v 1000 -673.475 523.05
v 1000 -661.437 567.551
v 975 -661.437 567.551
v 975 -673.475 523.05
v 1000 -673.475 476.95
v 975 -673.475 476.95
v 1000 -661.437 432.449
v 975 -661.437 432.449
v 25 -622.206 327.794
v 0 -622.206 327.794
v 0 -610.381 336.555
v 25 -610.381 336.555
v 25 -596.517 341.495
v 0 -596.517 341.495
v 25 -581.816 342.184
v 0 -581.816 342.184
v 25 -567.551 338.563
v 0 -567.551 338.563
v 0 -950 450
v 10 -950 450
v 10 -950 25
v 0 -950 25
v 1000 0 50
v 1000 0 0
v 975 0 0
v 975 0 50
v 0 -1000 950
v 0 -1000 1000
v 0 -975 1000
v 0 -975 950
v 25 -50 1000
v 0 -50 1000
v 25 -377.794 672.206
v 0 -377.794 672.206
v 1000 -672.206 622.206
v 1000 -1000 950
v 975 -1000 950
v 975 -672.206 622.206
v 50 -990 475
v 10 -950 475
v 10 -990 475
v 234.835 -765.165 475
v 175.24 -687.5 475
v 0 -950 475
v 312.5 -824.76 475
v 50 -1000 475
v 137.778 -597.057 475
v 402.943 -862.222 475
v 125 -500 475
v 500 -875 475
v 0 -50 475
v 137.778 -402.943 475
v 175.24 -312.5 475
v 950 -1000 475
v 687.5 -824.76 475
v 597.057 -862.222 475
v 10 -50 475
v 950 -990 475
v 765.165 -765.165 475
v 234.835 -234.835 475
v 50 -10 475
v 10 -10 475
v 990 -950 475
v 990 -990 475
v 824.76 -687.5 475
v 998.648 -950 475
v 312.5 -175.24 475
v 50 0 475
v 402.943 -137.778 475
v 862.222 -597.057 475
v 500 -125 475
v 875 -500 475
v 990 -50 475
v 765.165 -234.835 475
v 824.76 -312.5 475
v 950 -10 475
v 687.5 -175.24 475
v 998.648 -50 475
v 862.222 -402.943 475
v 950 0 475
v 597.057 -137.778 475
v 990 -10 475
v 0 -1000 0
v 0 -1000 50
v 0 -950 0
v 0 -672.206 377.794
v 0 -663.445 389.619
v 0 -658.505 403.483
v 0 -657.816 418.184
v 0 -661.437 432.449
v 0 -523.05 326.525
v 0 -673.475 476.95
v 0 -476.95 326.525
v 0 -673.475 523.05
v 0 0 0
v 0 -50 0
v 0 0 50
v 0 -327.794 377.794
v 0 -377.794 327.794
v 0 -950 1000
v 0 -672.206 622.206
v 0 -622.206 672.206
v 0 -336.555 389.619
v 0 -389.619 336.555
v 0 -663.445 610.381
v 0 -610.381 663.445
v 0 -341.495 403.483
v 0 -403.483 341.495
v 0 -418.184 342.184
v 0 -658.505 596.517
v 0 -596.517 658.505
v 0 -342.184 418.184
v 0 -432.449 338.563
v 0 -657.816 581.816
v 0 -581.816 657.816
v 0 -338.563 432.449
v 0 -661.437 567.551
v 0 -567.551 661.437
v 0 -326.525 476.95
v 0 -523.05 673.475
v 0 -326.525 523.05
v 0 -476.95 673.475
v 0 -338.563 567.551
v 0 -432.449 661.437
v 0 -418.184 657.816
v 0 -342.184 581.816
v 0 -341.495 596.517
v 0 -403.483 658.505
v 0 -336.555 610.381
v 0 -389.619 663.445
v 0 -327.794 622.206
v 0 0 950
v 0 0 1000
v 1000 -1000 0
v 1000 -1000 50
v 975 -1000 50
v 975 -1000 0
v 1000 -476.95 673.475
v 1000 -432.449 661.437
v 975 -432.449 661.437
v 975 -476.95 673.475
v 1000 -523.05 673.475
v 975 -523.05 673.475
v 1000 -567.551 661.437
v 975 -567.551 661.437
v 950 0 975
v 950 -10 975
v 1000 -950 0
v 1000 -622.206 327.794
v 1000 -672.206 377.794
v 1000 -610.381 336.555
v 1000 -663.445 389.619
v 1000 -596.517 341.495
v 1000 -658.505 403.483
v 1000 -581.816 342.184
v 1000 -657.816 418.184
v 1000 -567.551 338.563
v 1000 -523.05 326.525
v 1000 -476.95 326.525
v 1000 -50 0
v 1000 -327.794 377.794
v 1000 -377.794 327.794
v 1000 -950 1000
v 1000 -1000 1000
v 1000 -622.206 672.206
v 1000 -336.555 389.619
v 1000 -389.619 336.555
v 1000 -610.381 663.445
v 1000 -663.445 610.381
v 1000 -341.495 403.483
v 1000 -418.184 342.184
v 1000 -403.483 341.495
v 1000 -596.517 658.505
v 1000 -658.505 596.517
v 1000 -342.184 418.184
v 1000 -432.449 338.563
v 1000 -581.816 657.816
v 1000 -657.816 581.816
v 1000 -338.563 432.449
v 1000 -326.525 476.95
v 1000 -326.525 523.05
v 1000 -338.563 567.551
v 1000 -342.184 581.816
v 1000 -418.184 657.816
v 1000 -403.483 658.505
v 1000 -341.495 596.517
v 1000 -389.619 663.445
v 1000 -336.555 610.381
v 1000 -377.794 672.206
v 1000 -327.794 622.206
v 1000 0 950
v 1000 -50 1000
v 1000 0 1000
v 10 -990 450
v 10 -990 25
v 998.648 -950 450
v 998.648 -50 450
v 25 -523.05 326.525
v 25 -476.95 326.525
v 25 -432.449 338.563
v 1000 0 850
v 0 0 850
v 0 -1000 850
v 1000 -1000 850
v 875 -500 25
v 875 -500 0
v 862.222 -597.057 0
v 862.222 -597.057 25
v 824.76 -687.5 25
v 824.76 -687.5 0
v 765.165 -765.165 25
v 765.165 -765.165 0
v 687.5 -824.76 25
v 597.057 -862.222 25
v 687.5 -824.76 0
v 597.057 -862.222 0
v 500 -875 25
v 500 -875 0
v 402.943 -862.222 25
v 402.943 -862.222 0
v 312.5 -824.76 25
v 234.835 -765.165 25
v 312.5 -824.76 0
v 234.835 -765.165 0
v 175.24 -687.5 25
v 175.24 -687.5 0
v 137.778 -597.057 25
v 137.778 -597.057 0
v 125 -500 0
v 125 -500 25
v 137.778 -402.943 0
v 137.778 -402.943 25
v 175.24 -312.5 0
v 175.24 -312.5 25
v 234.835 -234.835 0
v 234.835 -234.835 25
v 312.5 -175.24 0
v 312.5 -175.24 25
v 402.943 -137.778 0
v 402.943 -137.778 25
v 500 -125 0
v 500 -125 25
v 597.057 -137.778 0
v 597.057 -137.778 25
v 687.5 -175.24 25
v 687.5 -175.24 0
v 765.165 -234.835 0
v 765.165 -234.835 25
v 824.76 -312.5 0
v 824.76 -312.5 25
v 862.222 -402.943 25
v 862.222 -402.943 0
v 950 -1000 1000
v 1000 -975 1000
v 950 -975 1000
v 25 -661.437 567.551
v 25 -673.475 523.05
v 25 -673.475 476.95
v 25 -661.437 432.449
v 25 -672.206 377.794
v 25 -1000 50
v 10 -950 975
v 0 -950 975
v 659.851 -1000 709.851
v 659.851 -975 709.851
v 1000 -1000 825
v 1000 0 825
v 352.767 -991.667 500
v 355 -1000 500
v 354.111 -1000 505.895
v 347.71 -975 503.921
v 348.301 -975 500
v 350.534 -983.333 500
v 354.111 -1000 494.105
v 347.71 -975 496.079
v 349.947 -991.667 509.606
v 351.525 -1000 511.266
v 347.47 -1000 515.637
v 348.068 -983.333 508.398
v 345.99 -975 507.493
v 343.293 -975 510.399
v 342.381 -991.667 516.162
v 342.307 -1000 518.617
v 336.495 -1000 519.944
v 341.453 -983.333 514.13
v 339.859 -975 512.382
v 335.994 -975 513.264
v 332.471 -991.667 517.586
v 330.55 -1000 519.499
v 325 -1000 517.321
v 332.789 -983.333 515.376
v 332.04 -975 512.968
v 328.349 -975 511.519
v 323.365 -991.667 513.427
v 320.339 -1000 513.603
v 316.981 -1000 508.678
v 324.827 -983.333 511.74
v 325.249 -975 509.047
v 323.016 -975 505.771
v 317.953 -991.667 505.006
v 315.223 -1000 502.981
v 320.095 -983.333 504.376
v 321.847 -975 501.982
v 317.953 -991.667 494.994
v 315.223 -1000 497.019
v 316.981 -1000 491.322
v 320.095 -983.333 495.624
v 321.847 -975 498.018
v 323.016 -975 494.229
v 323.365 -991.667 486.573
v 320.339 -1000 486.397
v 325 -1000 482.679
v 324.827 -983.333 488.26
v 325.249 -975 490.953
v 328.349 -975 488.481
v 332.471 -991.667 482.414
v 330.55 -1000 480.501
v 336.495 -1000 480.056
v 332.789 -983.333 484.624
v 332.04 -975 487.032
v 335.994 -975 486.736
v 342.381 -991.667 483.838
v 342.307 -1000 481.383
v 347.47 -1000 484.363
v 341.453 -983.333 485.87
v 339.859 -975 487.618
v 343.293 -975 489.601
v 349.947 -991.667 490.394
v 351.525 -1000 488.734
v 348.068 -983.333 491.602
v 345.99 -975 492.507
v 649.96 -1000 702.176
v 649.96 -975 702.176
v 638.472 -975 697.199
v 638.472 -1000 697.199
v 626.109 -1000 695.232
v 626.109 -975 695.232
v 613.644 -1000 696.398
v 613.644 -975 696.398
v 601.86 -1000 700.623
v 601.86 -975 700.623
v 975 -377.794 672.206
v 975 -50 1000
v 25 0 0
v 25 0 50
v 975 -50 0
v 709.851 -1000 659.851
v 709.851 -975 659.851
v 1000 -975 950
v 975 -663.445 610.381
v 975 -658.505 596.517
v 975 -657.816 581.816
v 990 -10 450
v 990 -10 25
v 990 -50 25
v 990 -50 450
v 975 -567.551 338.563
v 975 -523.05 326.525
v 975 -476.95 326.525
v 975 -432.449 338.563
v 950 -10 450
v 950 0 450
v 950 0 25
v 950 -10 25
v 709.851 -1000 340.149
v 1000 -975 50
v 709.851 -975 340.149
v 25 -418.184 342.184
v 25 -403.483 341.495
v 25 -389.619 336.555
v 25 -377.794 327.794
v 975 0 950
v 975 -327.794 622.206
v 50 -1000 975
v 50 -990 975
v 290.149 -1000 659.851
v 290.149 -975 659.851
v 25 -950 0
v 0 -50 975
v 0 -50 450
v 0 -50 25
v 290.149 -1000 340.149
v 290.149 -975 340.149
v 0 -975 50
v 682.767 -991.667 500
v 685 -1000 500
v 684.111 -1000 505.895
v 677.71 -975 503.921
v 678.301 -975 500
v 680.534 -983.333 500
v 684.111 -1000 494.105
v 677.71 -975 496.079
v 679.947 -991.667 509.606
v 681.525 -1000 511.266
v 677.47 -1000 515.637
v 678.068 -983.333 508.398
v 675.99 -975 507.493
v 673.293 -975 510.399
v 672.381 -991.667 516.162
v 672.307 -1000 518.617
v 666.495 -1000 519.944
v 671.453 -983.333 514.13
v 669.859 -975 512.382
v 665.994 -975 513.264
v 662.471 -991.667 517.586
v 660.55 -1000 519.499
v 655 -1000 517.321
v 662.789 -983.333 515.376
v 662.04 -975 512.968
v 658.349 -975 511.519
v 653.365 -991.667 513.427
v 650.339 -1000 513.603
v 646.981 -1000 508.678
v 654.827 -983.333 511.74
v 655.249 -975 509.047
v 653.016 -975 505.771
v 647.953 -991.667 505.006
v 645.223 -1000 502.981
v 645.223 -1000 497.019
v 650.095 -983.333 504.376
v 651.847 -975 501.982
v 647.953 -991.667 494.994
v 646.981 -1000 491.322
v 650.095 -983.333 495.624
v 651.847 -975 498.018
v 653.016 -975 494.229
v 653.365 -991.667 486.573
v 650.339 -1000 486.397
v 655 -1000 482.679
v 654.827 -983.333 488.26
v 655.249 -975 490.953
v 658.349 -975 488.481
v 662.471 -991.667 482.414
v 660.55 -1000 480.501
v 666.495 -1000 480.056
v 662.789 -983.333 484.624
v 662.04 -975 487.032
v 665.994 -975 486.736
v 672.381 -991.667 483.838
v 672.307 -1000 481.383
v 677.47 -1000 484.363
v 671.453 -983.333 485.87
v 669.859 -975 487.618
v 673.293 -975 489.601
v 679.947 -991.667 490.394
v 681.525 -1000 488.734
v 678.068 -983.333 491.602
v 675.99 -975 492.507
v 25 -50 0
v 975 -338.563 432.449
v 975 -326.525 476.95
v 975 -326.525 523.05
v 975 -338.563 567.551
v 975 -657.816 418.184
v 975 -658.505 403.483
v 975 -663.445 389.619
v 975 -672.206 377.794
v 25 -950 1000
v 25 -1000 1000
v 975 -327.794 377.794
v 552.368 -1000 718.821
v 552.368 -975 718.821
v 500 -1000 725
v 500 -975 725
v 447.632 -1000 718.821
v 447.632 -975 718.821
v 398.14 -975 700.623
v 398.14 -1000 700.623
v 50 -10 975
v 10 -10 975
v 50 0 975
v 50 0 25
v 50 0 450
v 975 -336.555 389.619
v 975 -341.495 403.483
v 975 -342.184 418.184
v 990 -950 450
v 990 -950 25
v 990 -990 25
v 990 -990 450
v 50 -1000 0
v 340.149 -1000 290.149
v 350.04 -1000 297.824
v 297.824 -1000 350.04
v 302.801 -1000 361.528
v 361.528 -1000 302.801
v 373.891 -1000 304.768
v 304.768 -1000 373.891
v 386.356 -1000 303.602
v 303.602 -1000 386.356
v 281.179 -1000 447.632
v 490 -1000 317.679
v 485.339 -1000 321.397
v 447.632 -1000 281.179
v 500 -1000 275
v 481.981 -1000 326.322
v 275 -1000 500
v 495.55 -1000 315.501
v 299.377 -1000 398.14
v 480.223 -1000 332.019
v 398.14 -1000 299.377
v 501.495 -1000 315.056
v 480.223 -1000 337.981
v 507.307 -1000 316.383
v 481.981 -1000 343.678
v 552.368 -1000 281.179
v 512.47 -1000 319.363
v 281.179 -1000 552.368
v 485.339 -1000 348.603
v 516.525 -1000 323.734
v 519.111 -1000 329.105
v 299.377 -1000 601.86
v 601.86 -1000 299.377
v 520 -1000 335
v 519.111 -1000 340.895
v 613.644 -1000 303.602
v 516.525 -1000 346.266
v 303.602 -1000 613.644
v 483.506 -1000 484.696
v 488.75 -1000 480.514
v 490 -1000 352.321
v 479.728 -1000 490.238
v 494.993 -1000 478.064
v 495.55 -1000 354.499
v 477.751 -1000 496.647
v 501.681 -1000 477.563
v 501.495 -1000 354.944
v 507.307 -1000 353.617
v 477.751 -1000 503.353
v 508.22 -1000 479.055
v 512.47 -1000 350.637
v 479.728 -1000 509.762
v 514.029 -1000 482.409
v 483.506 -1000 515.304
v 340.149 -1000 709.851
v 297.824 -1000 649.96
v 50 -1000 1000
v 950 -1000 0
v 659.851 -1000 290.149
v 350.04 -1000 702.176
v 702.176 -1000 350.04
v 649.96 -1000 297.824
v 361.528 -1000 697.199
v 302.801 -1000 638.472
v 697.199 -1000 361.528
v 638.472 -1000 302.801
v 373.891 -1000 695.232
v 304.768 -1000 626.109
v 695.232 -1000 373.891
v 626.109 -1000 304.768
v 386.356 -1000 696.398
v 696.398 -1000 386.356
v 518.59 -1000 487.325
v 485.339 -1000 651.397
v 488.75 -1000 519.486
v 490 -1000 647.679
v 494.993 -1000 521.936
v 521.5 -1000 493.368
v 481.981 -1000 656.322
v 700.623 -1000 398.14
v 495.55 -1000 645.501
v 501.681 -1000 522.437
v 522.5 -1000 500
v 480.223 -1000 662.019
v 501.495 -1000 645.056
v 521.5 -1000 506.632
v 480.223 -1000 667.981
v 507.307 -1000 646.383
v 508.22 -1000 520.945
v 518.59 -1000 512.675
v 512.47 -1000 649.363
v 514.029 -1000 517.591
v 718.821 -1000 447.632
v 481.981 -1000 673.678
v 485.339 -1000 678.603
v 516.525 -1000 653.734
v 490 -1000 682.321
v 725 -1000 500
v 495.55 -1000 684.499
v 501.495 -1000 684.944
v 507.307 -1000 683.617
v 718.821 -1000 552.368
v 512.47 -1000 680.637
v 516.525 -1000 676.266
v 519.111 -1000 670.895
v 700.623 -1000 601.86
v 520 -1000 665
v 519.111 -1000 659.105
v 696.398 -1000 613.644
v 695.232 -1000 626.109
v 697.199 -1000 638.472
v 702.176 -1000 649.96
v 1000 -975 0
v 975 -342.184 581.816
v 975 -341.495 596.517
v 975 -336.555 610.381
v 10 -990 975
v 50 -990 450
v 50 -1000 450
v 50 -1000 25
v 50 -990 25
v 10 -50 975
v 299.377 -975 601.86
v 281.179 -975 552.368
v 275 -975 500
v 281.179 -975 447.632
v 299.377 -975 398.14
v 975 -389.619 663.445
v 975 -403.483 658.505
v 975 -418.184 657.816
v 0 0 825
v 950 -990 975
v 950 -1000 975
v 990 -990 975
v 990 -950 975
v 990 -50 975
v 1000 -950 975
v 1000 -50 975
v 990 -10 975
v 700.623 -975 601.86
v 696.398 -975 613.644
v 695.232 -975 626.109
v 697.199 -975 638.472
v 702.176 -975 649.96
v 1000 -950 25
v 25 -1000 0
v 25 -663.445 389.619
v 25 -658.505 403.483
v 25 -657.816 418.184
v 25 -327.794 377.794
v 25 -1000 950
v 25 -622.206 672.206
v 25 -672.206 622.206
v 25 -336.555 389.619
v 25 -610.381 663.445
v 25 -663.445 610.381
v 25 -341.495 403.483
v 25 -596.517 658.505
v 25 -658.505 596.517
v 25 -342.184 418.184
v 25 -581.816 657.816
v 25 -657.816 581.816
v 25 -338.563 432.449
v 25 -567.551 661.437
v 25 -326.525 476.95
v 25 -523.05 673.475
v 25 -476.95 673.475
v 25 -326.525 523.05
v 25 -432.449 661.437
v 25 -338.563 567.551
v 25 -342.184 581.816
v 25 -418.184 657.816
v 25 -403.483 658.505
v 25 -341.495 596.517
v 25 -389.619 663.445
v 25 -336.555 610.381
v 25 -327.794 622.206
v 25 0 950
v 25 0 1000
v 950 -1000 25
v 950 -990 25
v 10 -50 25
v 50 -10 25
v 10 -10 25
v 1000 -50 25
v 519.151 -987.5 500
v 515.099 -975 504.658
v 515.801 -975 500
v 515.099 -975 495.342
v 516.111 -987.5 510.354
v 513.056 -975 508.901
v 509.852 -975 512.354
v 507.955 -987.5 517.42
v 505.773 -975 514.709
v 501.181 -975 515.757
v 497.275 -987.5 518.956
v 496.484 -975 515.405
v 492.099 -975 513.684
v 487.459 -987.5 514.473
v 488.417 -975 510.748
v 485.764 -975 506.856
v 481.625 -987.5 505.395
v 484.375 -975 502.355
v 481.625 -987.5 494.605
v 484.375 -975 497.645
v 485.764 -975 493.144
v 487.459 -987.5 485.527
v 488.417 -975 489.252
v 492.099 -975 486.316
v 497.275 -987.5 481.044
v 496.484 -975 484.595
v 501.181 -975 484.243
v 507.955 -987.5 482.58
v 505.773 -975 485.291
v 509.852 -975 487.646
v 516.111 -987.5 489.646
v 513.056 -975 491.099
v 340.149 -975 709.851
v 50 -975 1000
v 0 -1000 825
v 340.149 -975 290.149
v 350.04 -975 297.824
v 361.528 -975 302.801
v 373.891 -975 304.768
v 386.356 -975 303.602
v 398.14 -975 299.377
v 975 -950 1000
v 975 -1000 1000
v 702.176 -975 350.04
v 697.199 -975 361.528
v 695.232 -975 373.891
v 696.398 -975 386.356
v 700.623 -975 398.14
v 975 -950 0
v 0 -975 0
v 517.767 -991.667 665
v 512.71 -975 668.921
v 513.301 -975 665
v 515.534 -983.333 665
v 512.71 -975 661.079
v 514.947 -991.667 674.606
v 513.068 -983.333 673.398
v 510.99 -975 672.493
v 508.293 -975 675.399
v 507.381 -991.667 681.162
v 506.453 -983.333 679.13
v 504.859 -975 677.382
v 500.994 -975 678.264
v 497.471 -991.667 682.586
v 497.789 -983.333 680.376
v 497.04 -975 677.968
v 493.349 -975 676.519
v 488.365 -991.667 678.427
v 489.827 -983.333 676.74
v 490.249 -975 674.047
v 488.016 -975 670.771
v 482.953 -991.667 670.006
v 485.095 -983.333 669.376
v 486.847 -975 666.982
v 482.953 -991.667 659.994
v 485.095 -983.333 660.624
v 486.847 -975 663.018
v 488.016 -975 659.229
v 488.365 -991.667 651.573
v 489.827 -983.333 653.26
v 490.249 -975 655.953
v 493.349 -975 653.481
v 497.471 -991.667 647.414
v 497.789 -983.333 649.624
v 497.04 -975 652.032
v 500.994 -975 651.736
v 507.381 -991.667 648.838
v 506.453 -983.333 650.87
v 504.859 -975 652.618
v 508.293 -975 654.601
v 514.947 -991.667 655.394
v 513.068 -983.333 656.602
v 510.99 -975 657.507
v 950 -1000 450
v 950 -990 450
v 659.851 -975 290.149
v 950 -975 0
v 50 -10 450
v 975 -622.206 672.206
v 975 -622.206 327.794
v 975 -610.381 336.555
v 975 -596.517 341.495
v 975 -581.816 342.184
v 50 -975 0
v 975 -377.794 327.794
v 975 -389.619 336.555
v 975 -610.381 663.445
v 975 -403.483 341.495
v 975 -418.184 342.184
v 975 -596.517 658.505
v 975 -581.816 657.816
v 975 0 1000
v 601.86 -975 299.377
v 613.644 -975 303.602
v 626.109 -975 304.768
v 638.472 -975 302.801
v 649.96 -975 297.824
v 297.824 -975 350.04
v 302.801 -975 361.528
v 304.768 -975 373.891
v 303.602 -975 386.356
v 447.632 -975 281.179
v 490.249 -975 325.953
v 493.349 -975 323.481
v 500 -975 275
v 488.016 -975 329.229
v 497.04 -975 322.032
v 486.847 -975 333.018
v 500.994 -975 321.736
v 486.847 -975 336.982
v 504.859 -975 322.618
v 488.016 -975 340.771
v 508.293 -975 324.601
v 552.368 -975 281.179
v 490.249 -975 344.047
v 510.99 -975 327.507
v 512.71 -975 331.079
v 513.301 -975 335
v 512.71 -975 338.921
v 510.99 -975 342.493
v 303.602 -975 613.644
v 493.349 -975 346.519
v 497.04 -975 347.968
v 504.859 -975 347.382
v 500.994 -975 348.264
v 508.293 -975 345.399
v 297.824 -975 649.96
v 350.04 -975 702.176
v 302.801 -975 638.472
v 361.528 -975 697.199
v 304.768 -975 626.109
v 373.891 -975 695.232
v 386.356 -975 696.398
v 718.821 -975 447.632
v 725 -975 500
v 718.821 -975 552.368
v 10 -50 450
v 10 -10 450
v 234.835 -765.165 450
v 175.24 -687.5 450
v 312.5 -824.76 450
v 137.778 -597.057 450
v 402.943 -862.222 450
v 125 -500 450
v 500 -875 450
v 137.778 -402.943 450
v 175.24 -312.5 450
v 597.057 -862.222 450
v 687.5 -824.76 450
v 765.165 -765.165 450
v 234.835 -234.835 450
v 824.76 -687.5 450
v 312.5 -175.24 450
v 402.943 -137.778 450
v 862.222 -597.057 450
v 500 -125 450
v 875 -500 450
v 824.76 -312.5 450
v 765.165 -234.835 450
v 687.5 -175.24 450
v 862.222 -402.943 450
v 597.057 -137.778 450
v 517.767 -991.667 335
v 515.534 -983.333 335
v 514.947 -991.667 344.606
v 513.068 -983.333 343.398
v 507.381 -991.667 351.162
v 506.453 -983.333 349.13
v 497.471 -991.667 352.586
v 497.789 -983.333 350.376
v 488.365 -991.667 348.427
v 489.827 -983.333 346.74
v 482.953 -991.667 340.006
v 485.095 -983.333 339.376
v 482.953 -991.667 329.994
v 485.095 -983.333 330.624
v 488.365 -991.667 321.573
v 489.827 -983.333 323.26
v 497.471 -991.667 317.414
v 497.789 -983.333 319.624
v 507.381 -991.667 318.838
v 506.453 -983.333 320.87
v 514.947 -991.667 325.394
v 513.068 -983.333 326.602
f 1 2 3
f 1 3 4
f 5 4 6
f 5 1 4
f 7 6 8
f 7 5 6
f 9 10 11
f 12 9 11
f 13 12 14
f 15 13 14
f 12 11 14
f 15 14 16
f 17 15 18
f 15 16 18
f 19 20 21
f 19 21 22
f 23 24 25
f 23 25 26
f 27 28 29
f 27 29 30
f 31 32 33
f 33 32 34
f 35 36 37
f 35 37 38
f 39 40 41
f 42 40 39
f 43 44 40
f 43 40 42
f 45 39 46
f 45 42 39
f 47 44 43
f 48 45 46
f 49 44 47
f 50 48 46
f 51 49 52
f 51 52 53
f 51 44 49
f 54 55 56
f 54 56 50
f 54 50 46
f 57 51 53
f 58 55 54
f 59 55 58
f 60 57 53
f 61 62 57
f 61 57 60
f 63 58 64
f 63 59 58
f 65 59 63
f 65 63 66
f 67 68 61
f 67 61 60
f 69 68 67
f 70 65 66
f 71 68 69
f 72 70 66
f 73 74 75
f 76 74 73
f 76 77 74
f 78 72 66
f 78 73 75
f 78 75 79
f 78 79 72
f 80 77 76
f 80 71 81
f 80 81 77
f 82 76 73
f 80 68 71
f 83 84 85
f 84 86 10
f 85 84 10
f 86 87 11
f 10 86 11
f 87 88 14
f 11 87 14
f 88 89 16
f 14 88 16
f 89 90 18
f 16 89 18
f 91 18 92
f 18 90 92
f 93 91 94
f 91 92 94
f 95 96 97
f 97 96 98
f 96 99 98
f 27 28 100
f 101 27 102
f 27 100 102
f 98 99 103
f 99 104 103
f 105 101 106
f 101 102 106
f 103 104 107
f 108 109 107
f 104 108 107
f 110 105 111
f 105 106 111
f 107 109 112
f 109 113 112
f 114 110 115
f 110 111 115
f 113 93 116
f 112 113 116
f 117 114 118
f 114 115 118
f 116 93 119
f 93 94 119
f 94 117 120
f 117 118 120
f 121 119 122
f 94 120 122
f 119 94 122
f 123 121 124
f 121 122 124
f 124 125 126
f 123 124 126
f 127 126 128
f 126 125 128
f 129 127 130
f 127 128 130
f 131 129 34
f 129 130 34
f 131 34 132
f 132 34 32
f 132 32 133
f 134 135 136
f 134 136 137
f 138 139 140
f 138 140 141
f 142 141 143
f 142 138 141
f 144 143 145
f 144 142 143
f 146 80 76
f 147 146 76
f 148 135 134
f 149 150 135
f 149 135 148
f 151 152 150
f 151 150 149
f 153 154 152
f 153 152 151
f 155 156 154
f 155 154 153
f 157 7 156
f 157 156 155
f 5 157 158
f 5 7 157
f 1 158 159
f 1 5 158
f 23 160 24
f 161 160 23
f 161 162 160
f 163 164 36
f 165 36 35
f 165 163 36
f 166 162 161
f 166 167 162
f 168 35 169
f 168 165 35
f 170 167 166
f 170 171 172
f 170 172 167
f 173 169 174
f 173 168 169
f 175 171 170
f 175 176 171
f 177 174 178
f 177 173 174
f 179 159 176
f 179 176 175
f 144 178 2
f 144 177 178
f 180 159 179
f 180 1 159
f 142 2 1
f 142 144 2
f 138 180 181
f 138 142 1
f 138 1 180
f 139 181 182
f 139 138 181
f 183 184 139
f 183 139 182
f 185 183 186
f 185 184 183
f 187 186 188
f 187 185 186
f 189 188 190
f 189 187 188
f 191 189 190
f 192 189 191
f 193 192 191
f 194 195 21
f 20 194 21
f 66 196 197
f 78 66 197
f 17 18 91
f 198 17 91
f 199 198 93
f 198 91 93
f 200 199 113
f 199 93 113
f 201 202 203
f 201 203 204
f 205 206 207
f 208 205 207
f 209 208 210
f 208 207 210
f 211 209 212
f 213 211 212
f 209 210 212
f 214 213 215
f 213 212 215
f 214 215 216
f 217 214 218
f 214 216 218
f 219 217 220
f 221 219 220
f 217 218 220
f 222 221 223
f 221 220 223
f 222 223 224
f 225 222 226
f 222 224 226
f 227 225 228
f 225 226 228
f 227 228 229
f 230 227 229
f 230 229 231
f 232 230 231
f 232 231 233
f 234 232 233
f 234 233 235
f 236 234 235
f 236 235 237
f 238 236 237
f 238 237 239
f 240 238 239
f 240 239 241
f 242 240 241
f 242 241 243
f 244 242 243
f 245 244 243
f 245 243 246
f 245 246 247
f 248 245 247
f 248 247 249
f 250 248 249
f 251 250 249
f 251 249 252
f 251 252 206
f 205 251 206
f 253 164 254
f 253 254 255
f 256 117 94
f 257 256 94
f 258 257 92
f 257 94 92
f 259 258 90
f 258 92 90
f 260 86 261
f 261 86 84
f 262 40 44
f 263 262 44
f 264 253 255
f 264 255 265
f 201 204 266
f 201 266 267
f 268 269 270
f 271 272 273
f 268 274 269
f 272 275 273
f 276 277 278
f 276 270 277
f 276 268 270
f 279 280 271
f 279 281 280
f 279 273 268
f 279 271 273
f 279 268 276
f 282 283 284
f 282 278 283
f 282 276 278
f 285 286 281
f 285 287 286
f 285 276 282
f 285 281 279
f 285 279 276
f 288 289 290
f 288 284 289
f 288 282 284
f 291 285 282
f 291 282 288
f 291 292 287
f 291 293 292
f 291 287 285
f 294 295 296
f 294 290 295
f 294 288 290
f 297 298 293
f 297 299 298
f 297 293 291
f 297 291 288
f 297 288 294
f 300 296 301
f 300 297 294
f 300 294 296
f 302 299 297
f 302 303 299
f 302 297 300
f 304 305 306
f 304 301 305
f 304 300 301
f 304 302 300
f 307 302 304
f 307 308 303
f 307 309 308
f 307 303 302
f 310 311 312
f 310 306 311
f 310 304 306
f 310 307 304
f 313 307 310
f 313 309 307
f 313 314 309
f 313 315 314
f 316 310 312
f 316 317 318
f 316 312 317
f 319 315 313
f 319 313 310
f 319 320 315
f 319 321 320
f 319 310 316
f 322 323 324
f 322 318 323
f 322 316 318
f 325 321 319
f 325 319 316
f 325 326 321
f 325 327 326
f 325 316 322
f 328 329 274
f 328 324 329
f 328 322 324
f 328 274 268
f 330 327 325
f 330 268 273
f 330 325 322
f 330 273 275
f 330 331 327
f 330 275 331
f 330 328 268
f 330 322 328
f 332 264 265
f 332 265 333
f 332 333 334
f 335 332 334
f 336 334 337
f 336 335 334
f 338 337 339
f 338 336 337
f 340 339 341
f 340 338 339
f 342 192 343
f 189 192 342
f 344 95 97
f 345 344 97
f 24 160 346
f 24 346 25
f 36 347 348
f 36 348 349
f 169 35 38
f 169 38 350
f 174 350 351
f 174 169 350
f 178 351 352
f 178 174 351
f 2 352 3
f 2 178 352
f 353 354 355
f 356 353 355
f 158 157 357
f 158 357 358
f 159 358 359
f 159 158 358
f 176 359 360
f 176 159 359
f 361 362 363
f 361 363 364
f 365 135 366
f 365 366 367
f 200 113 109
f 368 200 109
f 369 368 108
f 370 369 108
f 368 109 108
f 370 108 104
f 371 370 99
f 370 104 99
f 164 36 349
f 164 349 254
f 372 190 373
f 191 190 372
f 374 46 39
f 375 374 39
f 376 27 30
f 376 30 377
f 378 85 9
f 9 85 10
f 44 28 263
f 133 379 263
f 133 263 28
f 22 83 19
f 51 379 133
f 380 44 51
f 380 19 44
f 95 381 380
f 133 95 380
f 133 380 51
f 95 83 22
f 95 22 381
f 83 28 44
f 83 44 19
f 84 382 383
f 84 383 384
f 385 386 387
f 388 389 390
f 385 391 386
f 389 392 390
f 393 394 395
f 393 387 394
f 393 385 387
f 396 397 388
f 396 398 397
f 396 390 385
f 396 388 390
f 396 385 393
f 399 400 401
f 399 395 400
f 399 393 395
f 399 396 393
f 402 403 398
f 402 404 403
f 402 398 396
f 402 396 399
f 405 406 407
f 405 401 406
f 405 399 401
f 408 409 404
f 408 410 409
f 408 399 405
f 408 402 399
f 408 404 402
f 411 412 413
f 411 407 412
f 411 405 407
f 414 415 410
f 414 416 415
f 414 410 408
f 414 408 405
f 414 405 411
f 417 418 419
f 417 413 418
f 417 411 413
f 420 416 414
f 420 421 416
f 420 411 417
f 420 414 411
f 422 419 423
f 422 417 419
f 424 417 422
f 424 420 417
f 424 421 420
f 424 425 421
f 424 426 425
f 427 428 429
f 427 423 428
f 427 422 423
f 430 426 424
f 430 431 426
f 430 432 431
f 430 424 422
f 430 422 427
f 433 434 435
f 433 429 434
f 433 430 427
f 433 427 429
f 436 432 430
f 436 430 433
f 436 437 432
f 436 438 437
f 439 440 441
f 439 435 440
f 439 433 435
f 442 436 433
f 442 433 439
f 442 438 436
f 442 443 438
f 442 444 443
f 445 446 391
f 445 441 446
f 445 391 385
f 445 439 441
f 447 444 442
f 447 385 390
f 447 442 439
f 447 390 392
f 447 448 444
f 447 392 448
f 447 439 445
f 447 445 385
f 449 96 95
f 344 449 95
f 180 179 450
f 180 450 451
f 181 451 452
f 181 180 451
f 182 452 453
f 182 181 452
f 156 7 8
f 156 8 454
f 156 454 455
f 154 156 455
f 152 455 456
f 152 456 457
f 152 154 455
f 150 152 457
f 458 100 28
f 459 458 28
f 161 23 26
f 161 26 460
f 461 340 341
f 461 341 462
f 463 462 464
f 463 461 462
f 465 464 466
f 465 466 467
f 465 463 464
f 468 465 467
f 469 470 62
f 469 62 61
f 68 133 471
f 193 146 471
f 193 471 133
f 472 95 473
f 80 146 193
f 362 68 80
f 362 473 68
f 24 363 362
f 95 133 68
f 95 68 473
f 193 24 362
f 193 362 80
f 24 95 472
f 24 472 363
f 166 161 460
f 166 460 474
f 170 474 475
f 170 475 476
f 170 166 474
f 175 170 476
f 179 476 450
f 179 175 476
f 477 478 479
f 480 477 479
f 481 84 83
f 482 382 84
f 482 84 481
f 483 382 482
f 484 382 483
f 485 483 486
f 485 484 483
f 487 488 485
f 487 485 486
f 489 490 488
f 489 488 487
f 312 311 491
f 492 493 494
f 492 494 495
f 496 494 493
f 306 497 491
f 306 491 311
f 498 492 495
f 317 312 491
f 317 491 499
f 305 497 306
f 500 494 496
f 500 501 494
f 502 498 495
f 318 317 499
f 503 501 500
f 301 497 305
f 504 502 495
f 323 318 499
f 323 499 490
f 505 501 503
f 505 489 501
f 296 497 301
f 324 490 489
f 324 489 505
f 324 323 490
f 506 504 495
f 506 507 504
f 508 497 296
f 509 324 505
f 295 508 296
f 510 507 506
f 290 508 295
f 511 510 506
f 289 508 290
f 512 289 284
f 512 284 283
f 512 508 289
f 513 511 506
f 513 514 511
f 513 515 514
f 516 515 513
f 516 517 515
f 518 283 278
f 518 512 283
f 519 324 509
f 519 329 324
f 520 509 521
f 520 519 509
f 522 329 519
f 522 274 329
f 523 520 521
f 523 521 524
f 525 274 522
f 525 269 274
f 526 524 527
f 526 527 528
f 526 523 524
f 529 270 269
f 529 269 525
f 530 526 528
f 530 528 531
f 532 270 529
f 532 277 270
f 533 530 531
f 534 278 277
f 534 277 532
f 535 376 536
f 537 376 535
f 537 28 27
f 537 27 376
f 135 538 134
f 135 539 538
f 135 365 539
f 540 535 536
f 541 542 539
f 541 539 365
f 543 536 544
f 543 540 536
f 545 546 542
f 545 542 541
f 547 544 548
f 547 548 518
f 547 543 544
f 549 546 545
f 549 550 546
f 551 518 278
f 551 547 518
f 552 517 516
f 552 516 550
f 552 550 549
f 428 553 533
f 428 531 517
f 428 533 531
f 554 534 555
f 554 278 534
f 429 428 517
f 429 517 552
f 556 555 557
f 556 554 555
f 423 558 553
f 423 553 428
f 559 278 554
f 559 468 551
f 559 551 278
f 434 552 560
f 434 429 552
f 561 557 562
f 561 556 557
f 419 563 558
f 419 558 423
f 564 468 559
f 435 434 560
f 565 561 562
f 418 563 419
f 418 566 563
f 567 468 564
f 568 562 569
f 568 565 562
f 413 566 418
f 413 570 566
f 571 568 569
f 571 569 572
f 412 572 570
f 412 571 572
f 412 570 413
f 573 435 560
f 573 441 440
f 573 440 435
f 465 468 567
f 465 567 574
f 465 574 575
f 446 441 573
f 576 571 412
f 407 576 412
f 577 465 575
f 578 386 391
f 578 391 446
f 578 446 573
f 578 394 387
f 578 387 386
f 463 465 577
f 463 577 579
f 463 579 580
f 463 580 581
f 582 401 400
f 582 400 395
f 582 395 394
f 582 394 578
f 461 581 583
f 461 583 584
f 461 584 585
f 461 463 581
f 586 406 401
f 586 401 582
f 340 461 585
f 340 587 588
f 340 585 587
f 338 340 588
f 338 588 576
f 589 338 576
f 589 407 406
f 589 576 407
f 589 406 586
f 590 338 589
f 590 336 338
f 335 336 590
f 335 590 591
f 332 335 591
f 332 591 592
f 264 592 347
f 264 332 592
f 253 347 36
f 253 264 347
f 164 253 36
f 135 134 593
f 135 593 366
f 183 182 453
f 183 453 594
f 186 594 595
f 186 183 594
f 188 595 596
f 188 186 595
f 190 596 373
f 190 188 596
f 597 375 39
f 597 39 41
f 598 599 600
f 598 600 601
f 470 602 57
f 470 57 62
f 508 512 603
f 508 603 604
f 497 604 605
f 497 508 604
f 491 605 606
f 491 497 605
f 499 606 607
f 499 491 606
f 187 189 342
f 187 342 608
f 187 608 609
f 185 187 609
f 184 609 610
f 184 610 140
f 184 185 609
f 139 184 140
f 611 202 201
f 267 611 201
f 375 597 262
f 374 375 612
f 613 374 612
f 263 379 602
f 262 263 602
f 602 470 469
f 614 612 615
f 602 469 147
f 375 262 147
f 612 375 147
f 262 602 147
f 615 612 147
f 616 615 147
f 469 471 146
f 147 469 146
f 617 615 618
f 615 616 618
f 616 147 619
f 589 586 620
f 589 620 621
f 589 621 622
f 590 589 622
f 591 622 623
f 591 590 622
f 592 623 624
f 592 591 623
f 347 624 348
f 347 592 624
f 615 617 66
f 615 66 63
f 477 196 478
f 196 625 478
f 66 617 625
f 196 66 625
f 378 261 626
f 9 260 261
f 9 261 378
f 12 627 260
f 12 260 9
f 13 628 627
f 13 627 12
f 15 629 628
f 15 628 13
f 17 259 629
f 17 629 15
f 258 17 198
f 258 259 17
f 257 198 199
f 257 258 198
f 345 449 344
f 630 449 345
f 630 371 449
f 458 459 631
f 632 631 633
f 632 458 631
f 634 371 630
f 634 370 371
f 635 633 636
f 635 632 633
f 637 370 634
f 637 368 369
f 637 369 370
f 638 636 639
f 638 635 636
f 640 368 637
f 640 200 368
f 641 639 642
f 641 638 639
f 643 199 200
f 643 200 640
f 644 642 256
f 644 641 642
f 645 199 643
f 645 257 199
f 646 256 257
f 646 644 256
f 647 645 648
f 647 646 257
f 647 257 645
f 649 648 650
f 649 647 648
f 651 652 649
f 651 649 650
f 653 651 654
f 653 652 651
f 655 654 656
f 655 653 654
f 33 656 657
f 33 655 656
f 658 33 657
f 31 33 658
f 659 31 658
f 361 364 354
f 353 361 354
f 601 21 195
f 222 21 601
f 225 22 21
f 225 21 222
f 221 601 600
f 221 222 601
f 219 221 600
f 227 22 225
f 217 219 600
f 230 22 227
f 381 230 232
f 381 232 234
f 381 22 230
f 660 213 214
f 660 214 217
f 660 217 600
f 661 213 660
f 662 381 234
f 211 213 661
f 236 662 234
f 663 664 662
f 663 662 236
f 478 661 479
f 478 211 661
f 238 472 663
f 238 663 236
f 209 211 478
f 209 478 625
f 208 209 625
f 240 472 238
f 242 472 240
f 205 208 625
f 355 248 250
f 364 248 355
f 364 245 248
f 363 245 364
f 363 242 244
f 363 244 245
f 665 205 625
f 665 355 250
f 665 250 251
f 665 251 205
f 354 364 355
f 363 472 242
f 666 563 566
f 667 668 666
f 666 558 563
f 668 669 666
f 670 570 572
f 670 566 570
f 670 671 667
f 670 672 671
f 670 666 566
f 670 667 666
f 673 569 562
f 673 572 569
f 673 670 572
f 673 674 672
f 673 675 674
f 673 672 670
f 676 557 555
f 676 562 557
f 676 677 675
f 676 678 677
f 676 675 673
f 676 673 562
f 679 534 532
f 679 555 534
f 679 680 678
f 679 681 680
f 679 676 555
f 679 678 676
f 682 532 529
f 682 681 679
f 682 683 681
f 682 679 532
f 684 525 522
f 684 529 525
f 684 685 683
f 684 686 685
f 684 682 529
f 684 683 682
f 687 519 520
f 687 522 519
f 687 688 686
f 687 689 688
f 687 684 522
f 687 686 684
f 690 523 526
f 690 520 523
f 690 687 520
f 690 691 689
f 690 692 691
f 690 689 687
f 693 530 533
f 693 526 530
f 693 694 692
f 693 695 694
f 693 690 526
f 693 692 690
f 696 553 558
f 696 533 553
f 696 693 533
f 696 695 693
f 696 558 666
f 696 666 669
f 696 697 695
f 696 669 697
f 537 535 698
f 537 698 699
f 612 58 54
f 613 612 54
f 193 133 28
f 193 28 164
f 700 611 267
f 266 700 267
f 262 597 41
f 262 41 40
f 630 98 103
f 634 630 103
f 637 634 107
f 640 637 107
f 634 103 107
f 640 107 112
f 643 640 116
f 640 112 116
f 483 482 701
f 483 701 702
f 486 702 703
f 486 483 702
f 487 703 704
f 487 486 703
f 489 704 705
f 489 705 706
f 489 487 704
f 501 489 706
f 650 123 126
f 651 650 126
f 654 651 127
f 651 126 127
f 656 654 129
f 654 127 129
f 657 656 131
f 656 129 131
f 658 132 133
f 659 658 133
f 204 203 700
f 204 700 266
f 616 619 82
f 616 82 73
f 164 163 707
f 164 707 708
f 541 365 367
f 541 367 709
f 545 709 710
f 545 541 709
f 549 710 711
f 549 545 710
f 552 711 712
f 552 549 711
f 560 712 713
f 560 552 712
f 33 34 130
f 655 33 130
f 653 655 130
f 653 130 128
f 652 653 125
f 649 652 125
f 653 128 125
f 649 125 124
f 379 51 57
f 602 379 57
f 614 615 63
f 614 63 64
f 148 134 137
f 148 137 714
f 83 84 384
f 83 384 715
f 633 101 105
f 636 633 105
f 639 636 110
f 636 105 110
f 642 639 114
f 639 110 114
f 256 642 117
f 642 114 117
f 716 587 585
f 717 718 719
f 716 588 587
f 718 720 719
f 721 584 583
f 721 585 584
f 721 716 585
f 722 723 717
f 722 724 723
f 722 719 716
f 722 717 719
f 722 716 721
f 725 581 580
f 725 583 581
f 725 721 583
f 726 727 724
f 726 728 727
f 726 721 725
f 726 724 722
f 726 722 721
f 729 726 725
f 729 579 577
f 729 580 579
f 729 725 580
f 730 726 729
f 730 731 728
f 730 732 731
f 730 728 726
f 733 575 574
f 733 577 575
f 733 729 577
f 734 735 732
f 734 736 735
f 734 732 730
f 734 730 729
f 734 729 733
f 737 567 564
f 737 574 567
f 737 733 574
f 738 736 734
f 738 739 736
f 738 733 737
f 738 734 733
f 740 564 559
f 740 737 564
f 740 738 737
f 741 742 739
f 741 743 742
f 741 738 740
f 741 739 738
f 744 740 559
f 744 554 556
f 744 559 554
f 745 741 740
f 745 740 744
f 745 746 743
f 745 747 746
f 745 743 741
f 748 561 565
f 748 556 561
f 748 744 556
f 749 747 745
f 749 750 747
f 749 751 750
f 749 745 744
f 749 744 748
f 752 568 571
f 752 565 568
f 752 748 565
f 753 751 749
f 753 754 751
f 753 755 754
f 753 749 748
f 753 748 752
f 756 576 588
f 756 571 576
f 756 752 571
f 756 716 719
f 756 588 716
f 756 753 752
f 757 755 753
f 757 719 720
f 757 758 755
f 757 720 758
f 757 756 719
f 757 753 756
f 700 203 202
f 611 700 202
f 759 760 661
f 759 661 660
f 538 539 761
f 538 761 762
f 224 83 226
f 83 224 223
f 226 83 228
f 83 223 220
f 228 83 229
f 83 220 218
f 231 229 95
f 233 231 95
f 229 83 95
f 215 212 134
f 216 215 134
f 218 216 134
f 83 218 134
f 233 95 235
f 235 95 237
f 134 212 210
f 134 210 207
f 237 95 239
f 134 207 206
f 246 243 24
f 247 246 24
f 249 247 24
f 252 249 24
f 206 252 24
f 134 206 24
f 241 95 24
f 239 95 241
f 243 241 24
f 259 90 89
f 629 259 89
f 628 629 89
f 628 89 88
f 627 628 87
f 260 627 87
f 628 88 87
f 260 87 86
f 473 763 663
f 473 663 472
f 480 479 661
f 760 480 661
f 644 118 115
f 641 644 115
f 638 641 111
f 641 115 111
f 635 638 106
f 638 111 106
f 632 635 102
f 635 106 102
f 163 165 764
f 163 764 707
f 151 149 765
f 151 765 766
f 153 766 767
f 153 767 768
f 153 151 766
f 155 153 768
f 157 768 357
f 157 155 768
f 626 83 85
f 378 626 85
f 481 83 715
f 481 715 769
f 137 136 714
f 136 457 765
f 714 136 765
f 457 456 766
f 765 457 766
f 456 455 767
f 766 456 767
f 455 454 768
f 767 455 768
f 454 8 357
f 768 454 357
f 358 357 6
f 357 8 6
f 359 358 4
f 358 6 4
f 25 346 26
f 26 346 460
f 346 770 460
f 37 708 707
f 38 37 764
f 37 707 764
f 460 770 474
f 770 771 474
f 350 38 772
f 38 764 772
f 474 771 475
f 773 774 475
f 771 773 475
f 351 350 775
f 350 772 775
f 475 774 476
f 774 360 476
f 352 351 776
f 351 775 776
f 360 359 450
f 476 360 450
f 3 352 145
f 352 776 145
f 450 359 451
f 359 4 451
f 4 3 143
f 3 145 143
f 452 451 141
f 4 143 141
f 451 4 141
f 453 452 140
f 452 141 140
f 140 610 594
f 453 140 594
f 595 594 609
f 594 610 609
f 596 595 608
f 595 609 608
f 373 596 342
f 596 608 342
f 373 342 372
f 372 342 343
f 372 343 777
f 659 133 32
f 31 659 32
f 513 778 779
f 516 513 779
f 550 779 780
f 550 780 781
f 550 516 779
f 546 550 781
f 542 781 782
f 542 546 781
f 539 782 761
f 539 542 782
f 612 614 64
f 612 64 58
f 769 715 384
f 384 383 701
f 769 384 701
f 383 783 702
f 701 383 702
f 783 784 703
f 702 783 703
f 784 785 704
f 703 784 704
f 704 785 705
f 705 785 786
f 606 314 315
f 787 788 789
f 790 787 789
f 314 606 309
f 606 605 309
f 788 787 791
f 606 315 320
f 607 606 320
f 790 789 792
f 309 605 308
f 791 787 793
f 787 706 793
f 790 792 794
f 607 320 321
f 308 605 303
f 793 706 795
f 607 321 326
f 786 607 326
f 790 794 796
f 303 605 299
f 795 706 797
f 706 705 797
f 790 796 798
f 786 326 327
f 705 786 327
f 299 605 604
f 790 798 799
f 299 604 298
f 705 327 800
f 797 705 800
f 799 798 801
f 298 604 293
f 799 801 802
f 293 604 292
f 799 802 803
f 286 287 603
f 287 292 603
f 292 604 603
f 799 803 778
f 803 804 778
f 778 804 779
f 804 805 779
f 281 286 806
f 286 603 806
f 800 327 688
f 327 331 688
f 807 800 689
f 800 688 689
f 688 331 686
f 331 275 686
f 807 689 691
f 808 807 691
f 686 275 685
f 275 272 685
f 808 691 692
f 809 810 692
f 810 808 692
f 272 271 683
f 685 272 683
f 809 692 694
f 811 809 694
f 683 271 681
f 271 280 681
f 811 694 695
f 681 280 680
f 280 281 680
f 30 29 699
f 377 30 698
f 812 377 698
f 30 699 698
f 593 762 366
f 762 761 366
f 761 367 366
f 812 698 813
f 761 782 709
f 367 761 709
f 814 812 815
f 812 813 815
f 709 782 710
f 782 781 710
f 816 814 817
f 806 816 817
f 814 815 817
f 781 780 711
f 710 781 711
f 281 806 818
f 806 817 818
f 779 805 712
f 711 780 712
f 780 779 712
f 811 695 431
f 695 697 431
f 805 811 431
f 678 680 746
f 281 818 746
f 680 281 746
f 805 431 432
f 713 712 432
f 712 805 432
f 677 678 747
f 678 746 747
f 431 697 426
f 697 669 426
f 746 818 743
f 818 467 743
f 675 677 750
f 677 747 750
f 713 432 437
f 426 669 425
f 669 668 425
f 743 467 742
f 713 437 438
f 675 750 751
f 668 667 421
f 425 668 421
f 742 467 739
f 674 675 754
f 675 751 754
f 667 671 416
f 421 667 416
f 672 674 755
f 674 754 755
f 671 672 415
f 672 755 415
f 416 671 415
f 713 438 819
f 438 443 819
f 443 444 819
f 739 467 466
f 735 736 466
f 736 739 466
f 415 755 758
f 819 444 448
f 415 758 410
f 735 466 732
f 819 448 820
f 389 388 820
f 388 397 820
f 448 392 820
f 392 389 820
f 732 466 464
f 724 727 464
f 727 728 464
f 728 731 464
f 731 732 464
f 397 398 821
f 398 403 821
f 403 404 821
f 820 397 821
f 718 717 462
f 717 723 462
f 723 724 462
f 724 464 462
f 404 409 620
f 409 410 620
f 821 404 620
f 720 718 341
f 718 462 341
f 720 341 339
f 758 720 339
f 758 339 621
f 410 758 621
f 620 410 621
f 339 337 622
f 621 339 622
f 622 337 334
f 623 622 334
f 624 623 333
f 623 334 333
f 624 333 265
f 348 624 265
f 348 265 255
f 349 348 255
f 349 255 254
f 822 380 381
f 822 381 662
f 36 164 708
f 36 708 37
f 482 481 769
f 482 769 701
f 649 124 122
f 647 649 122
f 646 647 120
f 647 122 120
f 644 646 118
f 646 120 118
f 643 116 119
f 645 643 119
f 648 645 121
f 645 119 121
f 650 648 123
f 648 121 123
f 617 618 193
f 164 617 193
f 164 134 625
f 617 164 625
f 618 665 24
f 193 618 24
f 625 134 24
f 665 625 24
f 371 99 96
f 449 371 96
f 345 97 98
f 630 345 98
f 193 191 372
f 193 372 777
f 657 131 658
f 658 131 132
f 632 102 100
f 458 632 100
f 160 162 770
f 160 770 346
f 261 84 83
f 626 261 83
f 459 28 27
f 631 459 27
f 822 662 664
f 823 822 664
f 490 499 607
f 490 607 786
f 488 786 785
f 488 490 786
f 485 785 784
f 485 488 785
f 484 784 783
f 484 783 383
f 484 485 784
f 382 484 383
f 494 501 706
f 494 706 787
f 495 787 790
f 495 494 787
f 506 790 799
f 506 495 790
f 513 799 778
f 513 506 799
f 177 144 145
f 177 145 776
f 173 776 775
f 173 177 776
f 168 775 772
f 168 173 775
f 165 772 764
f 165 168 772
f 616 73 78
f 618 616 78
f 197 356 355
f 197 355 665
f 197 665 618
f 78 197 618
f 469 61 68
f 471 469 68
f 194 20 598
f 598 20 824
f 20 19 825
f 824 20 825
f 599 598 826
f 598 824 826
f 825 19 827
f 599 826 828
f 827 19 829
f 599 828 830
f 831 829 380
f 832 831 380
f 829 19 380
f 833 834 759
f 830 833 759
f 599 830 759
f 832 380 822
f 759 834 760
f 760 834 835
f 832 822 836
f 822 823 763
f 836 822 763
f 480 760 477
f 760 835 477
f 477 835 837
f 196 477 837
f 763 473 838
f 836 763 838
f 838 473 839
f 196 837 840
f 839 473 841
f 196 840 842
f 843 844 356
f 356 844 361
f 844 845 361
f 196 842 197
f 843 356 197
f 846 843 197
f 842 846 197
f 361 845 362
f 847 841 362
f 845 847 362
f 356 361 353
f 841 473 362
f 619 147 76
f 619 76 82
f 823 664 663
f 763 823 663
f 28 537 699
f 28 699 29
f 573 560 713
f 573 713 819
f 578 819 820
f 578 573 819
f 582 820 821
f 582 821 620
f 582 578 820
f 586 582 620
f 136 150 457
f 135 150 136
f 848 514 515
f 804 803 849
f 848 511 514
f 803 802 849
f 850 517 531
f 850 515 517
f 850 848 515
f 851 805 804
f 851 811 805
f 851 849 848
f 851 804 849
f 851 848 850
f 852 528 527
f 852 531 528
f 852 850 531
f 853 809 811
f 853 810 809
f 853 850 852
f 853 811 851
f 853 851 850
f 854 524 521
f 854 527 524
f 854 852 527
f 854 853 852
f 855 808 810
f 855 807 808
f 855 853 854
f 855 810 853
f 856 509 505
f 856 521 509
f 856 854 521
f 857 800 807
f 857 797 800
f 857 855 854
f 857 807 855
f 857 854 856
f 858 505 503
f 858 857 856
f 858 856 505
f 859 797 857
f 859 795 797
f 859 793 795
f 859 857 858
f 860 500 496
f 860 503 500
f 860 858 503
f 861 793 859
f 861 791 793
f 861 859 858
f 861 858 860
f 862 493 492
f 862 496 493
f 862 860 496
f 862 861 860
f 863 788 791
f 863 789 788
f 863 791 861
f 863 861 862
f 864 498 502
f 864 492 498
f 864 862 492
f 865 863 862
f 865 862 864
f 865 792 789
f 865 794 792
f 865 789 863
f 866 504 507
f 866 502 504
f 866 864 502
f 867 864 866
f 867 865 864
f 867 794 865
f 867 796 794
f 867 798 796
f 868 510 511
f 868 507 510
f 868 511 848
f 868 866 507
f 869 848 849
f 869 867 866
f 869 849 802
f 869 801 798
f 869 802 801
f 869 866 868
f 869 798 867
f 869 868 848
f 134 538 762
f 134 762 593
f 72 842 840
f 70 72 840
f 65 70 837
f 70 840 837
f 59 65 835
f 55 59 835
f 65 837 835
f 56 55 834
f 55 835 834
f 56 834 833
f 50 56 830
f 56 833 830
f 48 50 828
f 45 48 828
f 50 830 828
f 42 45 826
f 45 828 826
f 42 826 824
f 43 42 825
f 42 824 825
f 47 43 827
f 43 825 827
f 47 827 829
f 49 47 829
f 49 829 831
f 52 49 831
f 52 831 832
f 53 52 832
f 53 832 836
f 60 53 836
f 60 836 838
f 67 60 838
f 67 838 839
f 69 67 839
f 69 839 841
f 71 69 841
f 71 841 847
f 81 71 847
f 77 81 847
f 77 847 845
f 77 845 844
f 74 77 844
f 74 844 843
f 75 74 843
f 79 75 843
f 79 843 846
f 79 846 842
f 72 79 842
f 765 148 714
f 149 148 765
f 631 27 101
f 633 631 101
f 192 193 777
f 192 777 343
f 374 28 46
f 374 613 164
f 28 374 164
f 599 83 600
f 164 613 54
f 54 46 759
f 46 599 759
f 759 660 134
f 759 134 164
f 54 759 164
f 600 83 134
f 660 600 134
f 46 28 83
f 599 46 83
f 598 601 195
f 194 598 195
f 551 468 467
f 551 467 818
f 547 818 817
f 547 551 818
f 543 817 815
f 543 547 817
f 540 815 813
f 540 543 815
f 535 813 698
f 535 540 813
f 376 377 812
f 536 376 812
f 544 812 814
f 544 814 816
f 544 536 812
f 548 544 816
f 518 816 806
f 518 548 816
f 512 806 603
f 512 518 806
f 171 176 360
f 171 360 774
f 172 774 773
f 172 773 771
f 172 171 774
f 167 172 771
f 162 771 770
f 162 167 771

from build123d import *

# Parameters (mm, degrees)
F0_W      = 1000
F0_H      = 1000
F1_DEPTH  = 25
F3_DEPTH  = 950
F5_W      = 998.6482446112
F5_H      = 1000
F6_DEPTH  = 25
F8_W      = 1000
F8_H      = 1000
F9_DEPTH  = 25
F10_W     = 1000
F10_H     = 1000
F11_DEPTH = 25
F12_R     = 375
F13_DEPTH = 592
F15_DEPTH = 25
F16_R     = 22.5
F16_R_2   = 20
F17_DEPTH = 25
F17_TAPER = 15
F19_DEPTH = 25


with BuildPart() as f1:
    # F0 (on Top) → F1 (new body)
    with BuildSketch(Plane.XY):
        with Locations((500, -500)):
            Rectangle(F0_W, F0_H)
    extrude(amount=F1_DEPTH)

    # F2 (on face) → F3 (join)
    with BuildSketch(Plane.XY.offset(25)):
        Polygon((0, -950), (0, -1000), (50, -1000), (50, -990), (10, -990), (10, -950), align=None)
        Polygon((50, -10), (50, 0), (0, 0), (0, -50), (10, -50), (10, -10), align=None)
        Polygon((990, -990), (950, -990), (950, -1000), (1000, -1000), (1000, -950), (990, -950), align=None)
        Polygon((1000, -50), (1000, 0), (950, 0), (950, -10), (990, -10), (990, -50), align=None)
    extrude(amount=F3_DEPTH)

    # F5 (on offset) → F6 (join)
    with BuildSketch(Plane.XY.offset(450)):
        with Locations((499.3241223056, -500)):
            Rectangle(F5_W, F5_H)
    extrude(amount=F6_DEPTH)

    # F10 (on face) → F11 (join)
    with BuildSketch(Plane.XY.offset(975)):
        with Locations((500, -500)):
            Rectangle(F10_W, F10_H)
    extrude(amount=F11_DEPTH)

    # F12 (on face) → F13 (cut)
    with BuildSketch(Plane(origin=(0, 0, 0), x_dir=(1, 0, 0), z_dir=(0, 0, -1))):
        with Locations((500, 500)):
            Circle(F12_R)
    extrude(amount=-F13_DEPTH, mode=Mode.SUBTRACT)


with BuildPart() as f9:
    # F8 (on offset) → F9 (new body)
    with BuildSketch(Plane.XY.offset(850)):
        with Locations((500, -500)):
            Rectangle(F8_W, F8_H)
    extrude(amount=-F9_DEPTH)


with BuildPart() as f15:
    # F14 (on face) → F15 (new body)
    with BuildSketch(Plane.XZ.offset(1000)):
        with BuildLine():
            Line((950, 0), (1000, 0))
            Line((1000, 0), (1000, 50))
            Line((1000, 50), (709.8505695069, 340.1494304931))
            ThreePointArc((709.8505695069, 340.1494304931), (695.8271229848, 367.647573201), (700.6230160997, 398.1402659974))
            ThreePointArc((700.6230160997, 398.1402659974), (725, 500), (700.6230160997, 601.8597340026))
            ThreePointArc((700.6230160997, 601.8597340026), (695.8271229848, 632.352426799), (709.8505695069, 659.8505695069))
            Line((709.8505695069, 659.8505695069), (1000, 950))
            Line((1000, 950), (1000, 1000))
            Line((1000, 1000), (950, 1000))
            Line((950, 1000), (659.8505695069, 709.8505695069))
            ThreePointArc((659.8505695069, 709.8505695069), (632.352426799, 695.8271229848), (601.8597340026, 700.6230160997))
            ThreePointArc((601.8597340026, 700.6230160997), (500, 725), (398.1402659974, 700.6230160997))
            ThreePointArc((398.1402659974, 700.6230160997), (367.647573201, 695.8271229848), (340.1494304931, 709.8505695069))
            Line((340.1494304931, 709.8505695069), (50, 1000))
            Line((50, 1000), (0, 1000))
            Line((0, 1000), (0, 950))
            Line((0, 950), (290.1494304931, 659.8505695069))
            ThreePointArc((290.1494304931, 659.8505695069), (304.1728770152, 632.352426799), (299.3769839003, 601.8597340026))
            ThreePointArc((299.3769839003, 601.8597340026), (275, 500), (299.3769839003, 398.1402659974))
            ThreePointArc((299.3769839003, 398.1402659974), (304.1728770152, 367.647573201), (290.1494304931, 340.1494304931))
            Line((290.1494304931, 340.1494304931), (0, 50))
            Line((0, 50), (0, 0))
            Line((0, 0), (50, 0))
            Line((50, 0), (340.1494304931, 290.1494304931))
            ThreePointArc((340.1494304931, 290.1494304931), (367.647573201, 304.1728770152), (398.1402659974, 299.3769839003))
            ThreePointArc((398.1402659974, 299.3769839003), (500, 275), (601.8597340026, 299.3769839003))
            ThreePointArc((601.8597340026, 299.3769839003), (632.352426799, 304.1728770152), (659.8505695069, 290.1494304931))
            Line((659.8505695069, 290.1494304931), (950, 0))
        make_face()
    extrude(amount=-F15_DEPTH)

    # F16 (on face) → F17 (cut)
    with BuildSketch(Plane.XZ.offset(1000)):
        with Locations((500, 500)):
            Circle(F16_R)
        with Locations((500, 665)):
            Circle(F16_R_2)
        with Locations((335, 500)):
            Circle(F16_R_2)
        with Locations((500, 335)):
            Circle(F16_R_2)
        with Locations((665, 500)):
            Circle(F16_R_2)
    extrude(amount=-F17_DEPTH, taper=F17_TAPER, mode=Mode.SUBTRACT)


with BuildPart() as f19:
    # F18 (on face) → F19 (new body)
    with BuildSketch(Plane.YZ.offset(1000)):
        with BuildLine():
            Line((-950, 1000), (-1000, 1000))
            Line((-1000, 1000), (-1000, 950))
            Line((-1000, 950), (-672.2064300465, 622.2064300465))
            ThreePointArc((-672.2064300465, 622.2064300465), (-658.5050372176, 596.5173755083), (-661.4369315268, 567.5508485456))
            ThreePointArc((-661.4369315268, 567.5508485456), (-675, 500), (-661.4369315268, 432.4491514544))
            ThreePointArc((-661.4369315268, 432.4491514544), (-658.5050372176, 403.4826244917), (-672.2064300465, 377.7935699535))
            Line((-672.2064300465, 377.7935699535), (-1000, 50))
            Line((-1000, 50), (-1000, 0))
            Line((-1000, 0), (-950, 0))
            Line((-950, 0), (-622.2064300465, 327.7935699535))
            ThreePointArc((-622.2064300465, 327.7935699535), (-596.5173755083, 341.4949627824), (-567.5508485456, 338.5630684732))
            ThreePointArc((-567.5508485456, 338.5630684732), (-500, 325), (-432.4491514544, 338.5630684732))
            ThreePointArc((-432.4491514544, 338.5630684732), (-403.4826244917, 341.4949627824), (-377.7935699535, 327.7935699535))
            Line((-377.7935699535, 327.7935699535), (-50, 0))
            Line((-50, 0), (0, 0))
            Line((0, 0), (0, 50))
            Line((0, 50), (-327.7935699535, 377.7935699535))
            ThreePointArc((-327.7935699535, 377.7935699535), (-341.4949627824, 403.4826244917), (-338.5630684732, 432.4491514544))
            ThreePointArc((-338.5630684732, 432.4491514544), (-325, 500), (-338.5630684732, 567.5508485456))
            ThreePointArc((-338.5630684732, 567.5508485456), (-341.4949627824, 596.5173755083), (-327.7935699535, 622.2064300465))
            Line((-327.7935699535, 622.2064300465), (0, 950))
            Line((0, 950), (0, 1000))
            Line((0, 1000), (-50, 1000))
            Line((-50, 1000), (-377.7935699535, 672.2064300465))
            ThreePointArc((-377.7935699535, 672.2064300465), (-403.4826244917, 658.5050372176), (-432.4491514544, 661.4369315268))
            ThreePointArc((-432.4491514544, 661.4369315268), (-500, 675), (-567.5508485456, 661.4369315268))
            ThreePointArc((-567.5508485456, 661.4369315268), (-596.5173755083, 658.5050372176), (-622.2064300465, 672.2064300465))
            Line((-622.2064300465, 672.2064300465), (-950, 1000))
        make_face()
    extrude(amount=-F19_DEPTH)


with BuildPart() as f21_1:
    # F21: instance of F19
    add(f19.part.mirror(Plane.YZ.offset(500)))


solid = Compound([f1.part, f9.part, f15.part, f19.part, f21_1.part])
